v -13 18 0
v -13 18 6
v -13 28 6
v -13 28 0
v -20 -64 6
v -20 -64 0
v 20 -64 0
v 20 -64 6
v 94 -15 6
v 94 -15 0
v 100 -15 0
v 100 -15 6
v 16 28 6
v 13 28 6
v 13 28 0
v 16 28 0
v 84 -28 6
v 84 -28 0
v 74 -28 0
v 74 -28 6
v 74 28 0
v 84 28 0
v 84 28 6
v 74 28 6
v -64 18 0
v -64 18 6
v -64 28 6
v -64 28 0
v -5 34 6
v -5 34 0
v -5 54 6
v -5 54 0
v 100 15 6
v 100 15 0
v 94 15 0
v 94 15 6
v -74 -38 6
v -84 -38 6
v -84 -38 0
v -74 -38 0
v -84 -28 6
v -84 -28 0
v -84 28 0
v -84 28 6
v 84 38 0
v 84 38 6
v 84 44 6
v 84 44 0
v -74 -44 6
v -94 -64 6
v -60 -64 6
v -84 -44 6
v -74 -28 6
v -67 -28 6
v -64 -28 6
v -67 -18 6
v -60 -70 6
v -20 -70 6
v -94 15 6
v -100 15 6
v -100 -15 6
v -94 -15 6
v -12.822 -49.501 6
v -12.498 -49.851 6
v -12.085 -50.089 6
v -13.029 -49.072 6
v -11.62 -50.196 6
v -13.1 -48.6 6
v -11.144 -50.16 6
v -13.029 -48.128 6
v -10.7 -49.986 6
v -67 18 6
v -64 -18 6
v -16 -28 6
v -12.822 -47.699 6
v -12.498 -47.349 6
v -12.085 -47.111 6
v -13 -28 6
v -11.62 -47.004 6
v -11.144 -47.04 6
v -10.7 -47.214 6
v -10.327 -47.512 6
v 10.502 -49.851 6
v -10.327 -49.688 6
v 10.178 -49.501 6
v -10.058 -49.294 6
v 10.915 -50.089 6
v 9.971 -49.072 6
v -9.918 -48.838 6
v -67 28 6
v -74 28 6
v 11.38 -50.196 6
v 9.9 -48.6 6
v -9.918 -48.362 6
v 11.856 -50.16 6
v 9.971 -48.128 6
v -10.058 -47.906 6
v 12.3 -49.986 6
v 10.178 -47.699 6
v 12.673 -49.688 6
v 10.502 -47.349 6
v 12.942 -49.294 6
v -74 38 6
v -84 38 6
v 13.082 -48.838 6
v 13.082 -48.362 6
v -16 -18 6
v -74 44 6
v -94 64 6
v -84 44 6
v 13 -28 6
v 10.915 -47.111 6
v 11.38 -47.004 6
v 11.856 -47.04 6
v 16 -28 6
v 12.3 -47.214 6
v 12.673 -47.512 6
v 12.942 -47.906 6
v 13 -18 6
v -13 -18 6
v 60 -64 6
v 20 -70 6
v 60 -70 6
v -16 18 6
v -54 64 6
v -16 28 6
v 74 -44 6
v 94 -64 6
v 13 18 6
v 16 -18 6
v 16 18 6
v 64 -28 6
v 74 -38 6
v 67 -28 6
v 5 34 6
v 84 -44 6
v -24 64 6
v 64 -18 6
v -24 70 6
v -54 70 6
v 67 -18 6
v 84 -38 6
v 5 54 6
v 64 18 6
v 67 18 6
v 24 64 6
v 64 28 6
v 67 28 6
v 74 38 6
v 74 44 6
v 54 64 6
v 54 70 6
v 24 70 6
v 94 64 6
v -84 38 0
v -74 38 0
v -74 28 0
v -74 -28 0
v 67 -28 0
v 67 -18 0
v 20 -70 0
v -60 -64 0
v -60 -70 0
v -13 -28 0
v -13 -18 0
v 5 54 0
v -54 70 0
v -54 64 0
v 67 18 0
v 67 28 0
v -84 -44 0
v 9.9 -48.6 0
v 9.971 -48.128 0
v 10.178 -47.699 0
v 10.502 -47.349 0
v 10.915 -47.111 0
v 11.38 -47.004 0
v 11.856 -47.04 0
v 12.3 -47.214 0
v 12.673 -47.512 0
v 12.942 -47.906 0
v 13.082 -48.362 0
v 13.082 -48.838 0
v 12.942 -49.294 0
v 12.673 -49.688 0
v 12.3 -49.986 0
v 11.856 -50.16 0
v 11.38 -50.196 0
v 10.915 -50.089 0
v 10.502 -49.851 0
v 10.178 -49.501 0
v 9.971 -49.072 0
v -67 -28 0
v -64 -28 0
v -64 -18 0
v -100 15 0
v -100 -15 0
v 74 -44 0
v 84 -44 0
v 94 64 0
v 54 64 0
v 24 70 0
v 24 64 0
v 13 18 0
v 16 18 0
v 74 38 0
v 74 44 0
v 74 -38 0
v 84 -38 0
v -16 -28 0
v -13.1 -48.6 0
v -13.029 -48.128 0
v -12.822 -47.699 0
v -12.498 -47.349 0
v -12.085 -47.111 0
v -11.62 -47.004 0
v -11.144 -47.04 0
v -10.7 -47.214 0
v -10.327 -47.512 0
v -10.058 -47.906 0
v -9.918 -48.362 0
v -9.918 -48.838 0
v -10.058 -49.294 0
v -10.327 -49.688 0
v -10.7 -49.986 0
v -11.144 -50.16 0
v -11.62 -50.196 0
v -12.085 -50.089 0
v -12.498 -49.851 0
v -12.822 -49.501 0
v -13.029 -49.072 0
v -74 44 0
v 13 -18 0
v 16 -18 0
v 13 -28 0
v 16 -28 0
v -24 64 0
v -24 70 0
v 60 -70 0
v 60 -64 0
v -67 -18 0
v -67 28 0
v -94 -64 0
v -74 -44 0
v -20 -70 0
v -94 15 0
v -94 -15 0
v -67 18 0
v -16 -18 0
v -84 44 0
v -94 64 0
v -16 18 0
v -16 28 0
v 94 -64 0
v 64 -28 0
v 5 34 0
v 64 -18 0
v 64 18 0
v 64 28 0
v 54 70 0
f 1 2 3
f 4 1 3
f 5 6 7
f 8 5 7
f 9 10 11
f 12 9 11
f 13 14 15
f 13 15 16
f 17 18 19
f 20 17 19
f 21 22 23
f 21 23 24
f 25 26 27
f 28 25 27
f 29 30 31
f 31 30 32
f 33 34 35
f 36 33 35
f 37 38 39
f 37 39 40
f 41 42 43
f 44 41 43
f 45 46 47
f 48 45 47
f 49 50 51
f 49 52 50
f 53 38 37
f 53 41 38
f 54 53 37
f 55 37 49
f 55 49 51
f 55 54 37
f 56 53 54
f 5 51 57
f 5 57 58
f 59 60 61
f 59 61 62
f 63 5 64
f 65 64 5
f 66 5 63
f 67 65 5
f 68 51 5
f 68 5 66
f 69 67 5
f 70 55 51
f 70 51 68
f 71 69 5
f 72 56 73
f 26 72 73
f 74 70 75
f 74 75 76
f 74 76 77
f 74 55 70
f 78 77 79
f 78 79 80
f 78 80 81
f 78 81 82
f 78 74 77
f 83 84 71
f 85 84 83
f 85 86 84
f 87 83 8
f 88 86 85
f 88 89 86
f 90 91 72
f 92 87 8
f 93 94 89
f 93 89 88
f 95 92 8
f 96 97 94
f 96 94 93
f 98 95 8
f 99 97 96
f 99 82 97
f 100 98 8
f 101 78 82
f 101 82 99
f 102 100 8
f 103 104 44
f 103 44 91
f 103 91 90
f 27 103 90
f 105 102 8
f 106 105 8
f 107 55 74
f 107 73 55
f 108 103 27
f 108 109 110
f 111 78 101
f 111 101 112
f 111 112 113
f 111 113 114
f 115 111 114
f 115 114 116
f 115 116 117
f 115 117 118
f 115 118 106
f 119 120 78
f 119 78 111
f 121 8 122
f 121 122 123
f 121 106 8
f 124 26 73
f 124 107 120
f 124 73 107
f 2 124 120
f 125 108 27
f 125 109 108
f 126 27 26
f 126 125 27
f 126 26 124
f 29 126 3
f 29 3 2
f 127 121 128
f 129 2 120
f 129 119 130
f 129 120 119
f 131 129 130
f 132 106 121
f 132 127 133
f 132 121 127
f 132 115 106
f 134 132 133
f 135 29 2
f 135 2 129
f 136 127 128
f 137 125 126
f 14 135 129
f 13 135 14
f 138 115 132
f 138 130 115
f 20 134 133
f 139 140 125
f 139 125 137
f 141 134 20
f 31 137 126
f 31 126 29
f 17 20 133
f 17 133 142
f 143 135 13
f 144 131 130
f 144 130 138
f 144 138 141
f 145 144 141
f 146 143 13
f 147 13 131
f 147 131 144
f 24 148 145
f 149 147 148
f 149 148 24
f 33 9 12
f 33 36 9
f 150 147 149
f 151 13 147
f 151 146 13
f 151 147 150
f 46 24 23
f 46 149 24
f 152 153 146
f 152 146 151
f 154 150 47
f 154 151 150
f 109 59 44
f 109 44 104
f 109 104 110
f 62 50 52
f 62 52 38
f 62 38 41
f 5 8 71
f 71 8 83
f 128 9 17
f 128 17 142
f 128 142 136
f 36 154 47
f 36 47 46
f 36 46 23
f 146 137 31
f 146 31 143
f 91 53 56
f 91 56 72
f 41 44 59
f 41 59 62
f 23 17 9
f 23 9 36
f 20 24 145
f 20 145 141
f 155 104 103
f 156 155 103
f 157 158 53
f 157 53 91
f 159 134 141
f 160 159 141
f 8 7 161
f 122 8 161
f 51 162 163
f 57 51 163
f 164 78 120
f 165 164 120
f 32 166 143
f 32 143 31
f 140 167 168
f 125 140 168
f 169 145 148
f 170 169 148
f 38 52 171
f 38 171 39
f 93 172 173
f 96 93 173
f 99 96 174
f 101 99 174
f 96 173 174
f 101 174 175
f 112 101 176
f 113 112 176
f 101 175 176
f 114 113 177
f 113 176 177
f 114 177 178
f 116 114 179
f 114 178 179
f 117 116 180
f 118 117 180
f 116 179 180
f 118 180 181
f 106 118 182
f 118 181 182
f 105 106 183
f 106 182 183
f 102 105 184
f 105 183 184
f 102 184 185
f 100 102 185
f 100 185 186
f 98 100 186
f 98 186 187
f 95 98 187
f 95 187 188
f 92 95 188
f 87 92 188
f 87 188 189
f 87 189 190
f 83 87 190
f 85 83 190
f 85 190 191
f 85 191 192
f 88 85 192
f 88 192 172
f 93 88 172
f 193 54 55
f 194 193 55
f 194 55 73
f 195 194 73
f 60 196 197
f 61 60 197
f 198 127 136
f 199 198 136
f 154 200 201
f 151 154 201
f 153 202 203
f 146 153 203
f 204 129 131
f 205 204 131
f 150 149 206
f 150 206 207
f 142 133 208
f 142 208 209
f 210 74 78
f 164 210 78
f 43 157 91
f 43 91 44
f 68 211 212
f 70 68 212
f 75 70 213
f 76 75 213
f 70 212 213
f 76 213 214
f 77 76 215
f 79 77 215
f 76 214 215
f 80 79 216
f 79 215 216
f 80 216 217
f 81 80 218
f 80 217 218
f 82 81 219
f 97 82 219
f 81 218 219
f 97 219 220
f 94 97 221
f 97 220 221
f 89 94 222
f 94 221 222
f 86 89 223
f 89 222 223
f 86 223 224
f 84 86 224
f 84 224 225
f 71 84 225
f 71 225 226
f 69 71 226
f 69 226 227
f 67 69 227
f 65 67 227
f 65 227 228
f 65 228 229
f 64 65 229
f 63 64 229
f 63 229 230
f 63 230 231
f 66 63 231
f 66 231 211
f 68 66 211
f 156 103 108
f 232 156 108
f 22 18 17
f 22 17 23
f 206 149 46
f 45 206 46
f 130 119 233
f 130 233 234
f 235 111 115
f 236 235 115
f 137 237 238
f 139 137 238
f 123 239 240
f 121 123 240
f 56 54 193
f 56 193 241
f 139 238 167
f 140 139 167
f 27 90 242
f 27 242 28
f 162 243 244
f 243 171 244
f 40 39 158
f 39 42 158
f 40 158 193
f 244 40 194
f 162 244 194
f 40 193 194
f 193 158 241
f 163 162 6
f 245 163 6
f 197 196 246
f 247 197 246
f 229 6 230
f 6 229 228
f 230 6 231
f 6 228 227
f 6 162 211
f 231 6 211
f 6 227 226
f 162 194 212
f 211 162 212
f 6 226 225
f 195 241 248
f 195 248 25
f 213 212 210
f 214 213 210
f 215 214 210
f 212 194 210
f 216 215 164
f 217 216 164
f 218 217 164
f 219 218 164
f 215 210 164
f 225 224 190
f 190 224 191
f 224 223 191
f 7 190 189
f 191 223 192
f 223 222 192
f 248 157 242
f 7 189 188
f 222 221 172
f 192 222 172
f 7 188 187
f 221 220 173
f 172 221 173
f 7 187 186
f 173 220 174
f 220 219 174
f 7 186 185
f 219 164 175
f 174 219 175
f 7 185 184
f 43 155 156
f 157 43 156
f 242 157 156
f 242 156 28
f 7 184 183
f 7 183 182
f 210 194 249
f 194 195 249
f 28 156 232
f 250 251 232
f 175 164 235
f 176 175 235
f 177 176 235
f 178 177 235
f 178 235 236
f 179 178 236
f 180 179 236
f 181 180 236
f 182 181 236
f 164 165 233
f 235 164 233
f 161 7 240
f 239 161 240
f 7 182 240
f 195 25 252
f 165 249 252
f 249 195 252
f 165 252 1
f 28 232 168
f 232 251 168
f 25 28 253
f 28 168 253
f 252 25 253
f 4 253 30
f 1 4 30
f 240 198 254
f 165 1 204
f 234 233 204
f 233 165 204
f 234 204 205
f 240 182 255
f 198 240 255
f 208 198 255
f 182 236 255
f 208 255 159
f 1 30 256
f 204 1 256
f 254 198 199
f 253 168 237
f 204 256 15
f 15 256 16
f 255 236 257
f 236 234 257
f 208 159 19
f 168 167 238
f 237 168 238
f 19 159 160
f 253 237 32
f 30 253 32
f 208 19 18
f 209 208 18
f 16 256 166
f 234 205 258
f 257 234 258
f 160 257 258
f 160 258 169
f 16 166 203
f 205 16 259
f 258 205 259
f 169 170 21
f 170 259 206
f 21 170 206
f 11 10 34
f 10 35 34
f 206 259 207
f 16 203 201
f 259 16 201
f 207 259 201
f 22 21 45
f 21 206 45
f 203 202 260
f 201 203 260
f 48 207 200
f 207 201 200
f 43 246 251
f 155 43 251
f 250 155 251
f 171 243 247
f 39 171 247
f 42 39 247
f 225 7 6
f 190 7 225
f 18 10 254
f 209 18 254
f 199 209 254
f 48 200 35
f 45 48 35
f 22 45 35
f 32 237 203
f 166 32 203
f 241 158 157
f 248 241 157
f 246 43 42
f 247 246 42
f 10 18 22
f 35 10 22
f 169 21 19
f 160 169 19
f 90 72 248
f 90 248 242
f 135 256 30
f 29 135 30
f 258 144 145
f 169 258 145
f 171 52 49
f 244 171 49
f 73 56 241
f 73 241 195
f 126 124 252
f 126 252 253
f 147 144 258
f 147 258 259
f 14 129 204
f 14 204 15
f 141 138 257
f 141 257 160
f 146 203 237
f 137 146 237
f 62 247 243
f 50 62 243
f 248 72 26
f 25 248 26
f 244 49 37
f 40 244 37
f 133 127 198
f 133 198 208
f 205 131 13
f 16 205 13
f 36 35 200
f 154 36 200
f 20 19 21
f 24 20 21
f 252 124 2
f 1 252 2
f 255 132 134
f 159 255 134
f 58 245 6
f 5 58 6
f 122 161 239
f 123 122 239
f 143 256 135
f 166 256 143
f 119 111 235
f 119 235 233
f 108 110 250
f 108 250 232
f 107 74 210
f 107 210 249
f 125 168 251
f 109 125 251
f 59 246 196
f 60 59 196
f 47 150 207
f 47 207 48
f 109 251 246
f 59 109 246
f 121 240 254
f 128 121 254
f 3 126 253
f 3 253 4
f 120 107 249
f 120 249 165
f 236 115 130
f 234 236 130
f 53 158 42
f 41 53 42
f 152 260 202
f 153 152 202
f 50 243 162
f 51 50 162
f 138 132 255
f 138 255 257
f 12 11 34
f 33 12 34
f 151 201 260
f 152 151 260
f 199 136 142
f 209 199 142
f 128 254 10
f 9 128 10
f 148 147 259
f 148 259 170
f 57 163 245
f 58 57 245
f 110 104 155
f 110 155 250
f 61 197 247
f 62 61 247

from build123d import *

# Parameters (mm, degrees)
BOSS_EXTRU_3_DEPTH      = 6
ESQUISSE2_W             = 3
ESQUISSE2_H             = 10
ENL_V_MAT_EXTRU_1_DEPTH = 10
ESQUISSE3_W             = 10
ESQUISSE3_H             = 6
ENL_V_MAT_EXTRU_2_DEPTH = 6
ESQUISSE4_W             = 10
ESQUISSE4_H             = 56
ENL_V_MAT_EXTRU_3_DEPTH = 6
ESQUISSE5_W             = 10
ESQUISSE5_H             = 20
ENL_V_MAT_EXTRU_4_DEPTH = 123.21292894
ESQUISSE6_R             = 1.6
ENL_V_MAT_EXTRU_5_DEPTH = 123.21292894


with BuildPart() as part:
    # Esquisse1 → Boss.-Extru.3 (new body)
    with BuildSketch(Plane.XY):
        Polygon((-94, 64), (-94, 15), (-100, 15), (-100, -15), (-94, -15), (-94, -64), (-60, -64), (-60, -70), (-20, -70), (-20, -64), (20, -64), (20, -70), (60, -70), (60, -64), (94, -64), (94, -15), (100, -15), (100, 15), (94, 15), (94, 64), (54, 64), (54, 70), (24, 70), (24, 64), (-24, 64), (-24, 70), (-54, 70), (-54, 64), align=None)
    extrude(amount=BOSS_EXTRU_3_DEPTH)

    # Esquisse2 → Enlèv. mat.-Extru.1 (cut)
    with BuildSketch(Plane.XY.offset(6)):
        with Locations((-65.5, -23)):
            Rectangle(ESQUISSE2_W, ESQUISSE2_H)
        with Locations((-65.5, 23)):
            Rectangle(ESQUISSE2_W, ESQUISSE2_H)
        with Locations((-14.5, -23)):
            Rectangle(ESQUISSE2_W, ESQUISSE2_H)
        with Locations((-14.5, 23)):
            Rectangle(ESQUISSE2_W, ESQUISSE2_H)
        with Locations((65.5, -23)):
            Rectangle(ESQUISSE2_W, ESQUISSE2_H)
        with Locations((14.5, 23)):
            Rectangle(ESQUISSE2_W, ESQUISSE2_H)
        with Locations((14.5, -23)):
            Rectangle(ESQUISSE2_W, ESQUISSE2_H)
        with Locations((65.5, 23)):
            Rectangle(ESQUISSE2_W, ESQUISSE2_H)
    extrude(amount=-ENL_V_MAT_EXTRU_1_DEPTH, mode=Mode.SUBTRACT)

    # Esquisse3 → Enlèv. mat.-Extru.2 (cut)
    with BuildSketch(Plane.XY.offset(6)):
        with Locations((-79, -41)):
            Rectangle(ESQUISSE3_W, ESQUISSE3_H)
        with Locations((79, -41)):
            Rectangle(ESQUISSE3_W, ESQUISSE3_H)
        with Locations((79, 41)):
            Rectangle(ESQUISSE3_W, ESQUISSE3_H)
        with Locations((-79, 41)):
            Rectangle(ESQUISSE3_W, ESQUISSE3_H)
    extrude(amount=-ENL_V_MAT_EXTRU_2_DEPTH, mode=Mode.SUBTRACT)

    # Esquisse4 → Enlèv. mat.-Extru.3 (cut)
    with BuildSketch(Plane(origin=(0, 0, 0), x_dir=(-1, 0, 0), z_dir=(0, 0, -1))):
        with Locations((79, 0)):
            Rectangle(ESQUISSE4_W, ESQUISSE4_H)
        with Locations((-79, 0)):
            Rectangle(ESQUISSE4_W, ESQUISSE4_H)
    extrude(amount=-ENL_V_MAT_EXTRU_3_DEPTH, mode=Mode.SUBTRACT)

    # Esquisse5 → Enlèv. mat.-Extru.4 (cut, through all)
    with BuildSketch(Plane(origin=(0, 0, 0), x_dir=(-1, 0, 0), z_dir=(0, 0, -1))):
        with Locations((0, 44)):
            Rectangle(ESQUISSE5_W, ESQUISSE5_H)
    extrude(amount=-ENL_V_MAT_EXTRU_4_DEPTH, mode=Mode.SUBTRACT)

    # Esquisse6 → Enlèv. mat.-Extru.5 (cut, through all)
    with BuildSketch(Plane(origin=(0, 0, 0), x_dir=(-1, 0, 0), z_dir=(0, 0, -1))):
        with Locations((-11.5, -48.6)):
            Circle(ESQUISSE6_R)
        with Locations((11.5, -48.6)):
            Circle(ESQUISSE6_R)
    extrude(amount=-ENL_V_MAT_EXTRU_5_DEPTH, mode=Mode.SUBTRACT)


solid = part.part
